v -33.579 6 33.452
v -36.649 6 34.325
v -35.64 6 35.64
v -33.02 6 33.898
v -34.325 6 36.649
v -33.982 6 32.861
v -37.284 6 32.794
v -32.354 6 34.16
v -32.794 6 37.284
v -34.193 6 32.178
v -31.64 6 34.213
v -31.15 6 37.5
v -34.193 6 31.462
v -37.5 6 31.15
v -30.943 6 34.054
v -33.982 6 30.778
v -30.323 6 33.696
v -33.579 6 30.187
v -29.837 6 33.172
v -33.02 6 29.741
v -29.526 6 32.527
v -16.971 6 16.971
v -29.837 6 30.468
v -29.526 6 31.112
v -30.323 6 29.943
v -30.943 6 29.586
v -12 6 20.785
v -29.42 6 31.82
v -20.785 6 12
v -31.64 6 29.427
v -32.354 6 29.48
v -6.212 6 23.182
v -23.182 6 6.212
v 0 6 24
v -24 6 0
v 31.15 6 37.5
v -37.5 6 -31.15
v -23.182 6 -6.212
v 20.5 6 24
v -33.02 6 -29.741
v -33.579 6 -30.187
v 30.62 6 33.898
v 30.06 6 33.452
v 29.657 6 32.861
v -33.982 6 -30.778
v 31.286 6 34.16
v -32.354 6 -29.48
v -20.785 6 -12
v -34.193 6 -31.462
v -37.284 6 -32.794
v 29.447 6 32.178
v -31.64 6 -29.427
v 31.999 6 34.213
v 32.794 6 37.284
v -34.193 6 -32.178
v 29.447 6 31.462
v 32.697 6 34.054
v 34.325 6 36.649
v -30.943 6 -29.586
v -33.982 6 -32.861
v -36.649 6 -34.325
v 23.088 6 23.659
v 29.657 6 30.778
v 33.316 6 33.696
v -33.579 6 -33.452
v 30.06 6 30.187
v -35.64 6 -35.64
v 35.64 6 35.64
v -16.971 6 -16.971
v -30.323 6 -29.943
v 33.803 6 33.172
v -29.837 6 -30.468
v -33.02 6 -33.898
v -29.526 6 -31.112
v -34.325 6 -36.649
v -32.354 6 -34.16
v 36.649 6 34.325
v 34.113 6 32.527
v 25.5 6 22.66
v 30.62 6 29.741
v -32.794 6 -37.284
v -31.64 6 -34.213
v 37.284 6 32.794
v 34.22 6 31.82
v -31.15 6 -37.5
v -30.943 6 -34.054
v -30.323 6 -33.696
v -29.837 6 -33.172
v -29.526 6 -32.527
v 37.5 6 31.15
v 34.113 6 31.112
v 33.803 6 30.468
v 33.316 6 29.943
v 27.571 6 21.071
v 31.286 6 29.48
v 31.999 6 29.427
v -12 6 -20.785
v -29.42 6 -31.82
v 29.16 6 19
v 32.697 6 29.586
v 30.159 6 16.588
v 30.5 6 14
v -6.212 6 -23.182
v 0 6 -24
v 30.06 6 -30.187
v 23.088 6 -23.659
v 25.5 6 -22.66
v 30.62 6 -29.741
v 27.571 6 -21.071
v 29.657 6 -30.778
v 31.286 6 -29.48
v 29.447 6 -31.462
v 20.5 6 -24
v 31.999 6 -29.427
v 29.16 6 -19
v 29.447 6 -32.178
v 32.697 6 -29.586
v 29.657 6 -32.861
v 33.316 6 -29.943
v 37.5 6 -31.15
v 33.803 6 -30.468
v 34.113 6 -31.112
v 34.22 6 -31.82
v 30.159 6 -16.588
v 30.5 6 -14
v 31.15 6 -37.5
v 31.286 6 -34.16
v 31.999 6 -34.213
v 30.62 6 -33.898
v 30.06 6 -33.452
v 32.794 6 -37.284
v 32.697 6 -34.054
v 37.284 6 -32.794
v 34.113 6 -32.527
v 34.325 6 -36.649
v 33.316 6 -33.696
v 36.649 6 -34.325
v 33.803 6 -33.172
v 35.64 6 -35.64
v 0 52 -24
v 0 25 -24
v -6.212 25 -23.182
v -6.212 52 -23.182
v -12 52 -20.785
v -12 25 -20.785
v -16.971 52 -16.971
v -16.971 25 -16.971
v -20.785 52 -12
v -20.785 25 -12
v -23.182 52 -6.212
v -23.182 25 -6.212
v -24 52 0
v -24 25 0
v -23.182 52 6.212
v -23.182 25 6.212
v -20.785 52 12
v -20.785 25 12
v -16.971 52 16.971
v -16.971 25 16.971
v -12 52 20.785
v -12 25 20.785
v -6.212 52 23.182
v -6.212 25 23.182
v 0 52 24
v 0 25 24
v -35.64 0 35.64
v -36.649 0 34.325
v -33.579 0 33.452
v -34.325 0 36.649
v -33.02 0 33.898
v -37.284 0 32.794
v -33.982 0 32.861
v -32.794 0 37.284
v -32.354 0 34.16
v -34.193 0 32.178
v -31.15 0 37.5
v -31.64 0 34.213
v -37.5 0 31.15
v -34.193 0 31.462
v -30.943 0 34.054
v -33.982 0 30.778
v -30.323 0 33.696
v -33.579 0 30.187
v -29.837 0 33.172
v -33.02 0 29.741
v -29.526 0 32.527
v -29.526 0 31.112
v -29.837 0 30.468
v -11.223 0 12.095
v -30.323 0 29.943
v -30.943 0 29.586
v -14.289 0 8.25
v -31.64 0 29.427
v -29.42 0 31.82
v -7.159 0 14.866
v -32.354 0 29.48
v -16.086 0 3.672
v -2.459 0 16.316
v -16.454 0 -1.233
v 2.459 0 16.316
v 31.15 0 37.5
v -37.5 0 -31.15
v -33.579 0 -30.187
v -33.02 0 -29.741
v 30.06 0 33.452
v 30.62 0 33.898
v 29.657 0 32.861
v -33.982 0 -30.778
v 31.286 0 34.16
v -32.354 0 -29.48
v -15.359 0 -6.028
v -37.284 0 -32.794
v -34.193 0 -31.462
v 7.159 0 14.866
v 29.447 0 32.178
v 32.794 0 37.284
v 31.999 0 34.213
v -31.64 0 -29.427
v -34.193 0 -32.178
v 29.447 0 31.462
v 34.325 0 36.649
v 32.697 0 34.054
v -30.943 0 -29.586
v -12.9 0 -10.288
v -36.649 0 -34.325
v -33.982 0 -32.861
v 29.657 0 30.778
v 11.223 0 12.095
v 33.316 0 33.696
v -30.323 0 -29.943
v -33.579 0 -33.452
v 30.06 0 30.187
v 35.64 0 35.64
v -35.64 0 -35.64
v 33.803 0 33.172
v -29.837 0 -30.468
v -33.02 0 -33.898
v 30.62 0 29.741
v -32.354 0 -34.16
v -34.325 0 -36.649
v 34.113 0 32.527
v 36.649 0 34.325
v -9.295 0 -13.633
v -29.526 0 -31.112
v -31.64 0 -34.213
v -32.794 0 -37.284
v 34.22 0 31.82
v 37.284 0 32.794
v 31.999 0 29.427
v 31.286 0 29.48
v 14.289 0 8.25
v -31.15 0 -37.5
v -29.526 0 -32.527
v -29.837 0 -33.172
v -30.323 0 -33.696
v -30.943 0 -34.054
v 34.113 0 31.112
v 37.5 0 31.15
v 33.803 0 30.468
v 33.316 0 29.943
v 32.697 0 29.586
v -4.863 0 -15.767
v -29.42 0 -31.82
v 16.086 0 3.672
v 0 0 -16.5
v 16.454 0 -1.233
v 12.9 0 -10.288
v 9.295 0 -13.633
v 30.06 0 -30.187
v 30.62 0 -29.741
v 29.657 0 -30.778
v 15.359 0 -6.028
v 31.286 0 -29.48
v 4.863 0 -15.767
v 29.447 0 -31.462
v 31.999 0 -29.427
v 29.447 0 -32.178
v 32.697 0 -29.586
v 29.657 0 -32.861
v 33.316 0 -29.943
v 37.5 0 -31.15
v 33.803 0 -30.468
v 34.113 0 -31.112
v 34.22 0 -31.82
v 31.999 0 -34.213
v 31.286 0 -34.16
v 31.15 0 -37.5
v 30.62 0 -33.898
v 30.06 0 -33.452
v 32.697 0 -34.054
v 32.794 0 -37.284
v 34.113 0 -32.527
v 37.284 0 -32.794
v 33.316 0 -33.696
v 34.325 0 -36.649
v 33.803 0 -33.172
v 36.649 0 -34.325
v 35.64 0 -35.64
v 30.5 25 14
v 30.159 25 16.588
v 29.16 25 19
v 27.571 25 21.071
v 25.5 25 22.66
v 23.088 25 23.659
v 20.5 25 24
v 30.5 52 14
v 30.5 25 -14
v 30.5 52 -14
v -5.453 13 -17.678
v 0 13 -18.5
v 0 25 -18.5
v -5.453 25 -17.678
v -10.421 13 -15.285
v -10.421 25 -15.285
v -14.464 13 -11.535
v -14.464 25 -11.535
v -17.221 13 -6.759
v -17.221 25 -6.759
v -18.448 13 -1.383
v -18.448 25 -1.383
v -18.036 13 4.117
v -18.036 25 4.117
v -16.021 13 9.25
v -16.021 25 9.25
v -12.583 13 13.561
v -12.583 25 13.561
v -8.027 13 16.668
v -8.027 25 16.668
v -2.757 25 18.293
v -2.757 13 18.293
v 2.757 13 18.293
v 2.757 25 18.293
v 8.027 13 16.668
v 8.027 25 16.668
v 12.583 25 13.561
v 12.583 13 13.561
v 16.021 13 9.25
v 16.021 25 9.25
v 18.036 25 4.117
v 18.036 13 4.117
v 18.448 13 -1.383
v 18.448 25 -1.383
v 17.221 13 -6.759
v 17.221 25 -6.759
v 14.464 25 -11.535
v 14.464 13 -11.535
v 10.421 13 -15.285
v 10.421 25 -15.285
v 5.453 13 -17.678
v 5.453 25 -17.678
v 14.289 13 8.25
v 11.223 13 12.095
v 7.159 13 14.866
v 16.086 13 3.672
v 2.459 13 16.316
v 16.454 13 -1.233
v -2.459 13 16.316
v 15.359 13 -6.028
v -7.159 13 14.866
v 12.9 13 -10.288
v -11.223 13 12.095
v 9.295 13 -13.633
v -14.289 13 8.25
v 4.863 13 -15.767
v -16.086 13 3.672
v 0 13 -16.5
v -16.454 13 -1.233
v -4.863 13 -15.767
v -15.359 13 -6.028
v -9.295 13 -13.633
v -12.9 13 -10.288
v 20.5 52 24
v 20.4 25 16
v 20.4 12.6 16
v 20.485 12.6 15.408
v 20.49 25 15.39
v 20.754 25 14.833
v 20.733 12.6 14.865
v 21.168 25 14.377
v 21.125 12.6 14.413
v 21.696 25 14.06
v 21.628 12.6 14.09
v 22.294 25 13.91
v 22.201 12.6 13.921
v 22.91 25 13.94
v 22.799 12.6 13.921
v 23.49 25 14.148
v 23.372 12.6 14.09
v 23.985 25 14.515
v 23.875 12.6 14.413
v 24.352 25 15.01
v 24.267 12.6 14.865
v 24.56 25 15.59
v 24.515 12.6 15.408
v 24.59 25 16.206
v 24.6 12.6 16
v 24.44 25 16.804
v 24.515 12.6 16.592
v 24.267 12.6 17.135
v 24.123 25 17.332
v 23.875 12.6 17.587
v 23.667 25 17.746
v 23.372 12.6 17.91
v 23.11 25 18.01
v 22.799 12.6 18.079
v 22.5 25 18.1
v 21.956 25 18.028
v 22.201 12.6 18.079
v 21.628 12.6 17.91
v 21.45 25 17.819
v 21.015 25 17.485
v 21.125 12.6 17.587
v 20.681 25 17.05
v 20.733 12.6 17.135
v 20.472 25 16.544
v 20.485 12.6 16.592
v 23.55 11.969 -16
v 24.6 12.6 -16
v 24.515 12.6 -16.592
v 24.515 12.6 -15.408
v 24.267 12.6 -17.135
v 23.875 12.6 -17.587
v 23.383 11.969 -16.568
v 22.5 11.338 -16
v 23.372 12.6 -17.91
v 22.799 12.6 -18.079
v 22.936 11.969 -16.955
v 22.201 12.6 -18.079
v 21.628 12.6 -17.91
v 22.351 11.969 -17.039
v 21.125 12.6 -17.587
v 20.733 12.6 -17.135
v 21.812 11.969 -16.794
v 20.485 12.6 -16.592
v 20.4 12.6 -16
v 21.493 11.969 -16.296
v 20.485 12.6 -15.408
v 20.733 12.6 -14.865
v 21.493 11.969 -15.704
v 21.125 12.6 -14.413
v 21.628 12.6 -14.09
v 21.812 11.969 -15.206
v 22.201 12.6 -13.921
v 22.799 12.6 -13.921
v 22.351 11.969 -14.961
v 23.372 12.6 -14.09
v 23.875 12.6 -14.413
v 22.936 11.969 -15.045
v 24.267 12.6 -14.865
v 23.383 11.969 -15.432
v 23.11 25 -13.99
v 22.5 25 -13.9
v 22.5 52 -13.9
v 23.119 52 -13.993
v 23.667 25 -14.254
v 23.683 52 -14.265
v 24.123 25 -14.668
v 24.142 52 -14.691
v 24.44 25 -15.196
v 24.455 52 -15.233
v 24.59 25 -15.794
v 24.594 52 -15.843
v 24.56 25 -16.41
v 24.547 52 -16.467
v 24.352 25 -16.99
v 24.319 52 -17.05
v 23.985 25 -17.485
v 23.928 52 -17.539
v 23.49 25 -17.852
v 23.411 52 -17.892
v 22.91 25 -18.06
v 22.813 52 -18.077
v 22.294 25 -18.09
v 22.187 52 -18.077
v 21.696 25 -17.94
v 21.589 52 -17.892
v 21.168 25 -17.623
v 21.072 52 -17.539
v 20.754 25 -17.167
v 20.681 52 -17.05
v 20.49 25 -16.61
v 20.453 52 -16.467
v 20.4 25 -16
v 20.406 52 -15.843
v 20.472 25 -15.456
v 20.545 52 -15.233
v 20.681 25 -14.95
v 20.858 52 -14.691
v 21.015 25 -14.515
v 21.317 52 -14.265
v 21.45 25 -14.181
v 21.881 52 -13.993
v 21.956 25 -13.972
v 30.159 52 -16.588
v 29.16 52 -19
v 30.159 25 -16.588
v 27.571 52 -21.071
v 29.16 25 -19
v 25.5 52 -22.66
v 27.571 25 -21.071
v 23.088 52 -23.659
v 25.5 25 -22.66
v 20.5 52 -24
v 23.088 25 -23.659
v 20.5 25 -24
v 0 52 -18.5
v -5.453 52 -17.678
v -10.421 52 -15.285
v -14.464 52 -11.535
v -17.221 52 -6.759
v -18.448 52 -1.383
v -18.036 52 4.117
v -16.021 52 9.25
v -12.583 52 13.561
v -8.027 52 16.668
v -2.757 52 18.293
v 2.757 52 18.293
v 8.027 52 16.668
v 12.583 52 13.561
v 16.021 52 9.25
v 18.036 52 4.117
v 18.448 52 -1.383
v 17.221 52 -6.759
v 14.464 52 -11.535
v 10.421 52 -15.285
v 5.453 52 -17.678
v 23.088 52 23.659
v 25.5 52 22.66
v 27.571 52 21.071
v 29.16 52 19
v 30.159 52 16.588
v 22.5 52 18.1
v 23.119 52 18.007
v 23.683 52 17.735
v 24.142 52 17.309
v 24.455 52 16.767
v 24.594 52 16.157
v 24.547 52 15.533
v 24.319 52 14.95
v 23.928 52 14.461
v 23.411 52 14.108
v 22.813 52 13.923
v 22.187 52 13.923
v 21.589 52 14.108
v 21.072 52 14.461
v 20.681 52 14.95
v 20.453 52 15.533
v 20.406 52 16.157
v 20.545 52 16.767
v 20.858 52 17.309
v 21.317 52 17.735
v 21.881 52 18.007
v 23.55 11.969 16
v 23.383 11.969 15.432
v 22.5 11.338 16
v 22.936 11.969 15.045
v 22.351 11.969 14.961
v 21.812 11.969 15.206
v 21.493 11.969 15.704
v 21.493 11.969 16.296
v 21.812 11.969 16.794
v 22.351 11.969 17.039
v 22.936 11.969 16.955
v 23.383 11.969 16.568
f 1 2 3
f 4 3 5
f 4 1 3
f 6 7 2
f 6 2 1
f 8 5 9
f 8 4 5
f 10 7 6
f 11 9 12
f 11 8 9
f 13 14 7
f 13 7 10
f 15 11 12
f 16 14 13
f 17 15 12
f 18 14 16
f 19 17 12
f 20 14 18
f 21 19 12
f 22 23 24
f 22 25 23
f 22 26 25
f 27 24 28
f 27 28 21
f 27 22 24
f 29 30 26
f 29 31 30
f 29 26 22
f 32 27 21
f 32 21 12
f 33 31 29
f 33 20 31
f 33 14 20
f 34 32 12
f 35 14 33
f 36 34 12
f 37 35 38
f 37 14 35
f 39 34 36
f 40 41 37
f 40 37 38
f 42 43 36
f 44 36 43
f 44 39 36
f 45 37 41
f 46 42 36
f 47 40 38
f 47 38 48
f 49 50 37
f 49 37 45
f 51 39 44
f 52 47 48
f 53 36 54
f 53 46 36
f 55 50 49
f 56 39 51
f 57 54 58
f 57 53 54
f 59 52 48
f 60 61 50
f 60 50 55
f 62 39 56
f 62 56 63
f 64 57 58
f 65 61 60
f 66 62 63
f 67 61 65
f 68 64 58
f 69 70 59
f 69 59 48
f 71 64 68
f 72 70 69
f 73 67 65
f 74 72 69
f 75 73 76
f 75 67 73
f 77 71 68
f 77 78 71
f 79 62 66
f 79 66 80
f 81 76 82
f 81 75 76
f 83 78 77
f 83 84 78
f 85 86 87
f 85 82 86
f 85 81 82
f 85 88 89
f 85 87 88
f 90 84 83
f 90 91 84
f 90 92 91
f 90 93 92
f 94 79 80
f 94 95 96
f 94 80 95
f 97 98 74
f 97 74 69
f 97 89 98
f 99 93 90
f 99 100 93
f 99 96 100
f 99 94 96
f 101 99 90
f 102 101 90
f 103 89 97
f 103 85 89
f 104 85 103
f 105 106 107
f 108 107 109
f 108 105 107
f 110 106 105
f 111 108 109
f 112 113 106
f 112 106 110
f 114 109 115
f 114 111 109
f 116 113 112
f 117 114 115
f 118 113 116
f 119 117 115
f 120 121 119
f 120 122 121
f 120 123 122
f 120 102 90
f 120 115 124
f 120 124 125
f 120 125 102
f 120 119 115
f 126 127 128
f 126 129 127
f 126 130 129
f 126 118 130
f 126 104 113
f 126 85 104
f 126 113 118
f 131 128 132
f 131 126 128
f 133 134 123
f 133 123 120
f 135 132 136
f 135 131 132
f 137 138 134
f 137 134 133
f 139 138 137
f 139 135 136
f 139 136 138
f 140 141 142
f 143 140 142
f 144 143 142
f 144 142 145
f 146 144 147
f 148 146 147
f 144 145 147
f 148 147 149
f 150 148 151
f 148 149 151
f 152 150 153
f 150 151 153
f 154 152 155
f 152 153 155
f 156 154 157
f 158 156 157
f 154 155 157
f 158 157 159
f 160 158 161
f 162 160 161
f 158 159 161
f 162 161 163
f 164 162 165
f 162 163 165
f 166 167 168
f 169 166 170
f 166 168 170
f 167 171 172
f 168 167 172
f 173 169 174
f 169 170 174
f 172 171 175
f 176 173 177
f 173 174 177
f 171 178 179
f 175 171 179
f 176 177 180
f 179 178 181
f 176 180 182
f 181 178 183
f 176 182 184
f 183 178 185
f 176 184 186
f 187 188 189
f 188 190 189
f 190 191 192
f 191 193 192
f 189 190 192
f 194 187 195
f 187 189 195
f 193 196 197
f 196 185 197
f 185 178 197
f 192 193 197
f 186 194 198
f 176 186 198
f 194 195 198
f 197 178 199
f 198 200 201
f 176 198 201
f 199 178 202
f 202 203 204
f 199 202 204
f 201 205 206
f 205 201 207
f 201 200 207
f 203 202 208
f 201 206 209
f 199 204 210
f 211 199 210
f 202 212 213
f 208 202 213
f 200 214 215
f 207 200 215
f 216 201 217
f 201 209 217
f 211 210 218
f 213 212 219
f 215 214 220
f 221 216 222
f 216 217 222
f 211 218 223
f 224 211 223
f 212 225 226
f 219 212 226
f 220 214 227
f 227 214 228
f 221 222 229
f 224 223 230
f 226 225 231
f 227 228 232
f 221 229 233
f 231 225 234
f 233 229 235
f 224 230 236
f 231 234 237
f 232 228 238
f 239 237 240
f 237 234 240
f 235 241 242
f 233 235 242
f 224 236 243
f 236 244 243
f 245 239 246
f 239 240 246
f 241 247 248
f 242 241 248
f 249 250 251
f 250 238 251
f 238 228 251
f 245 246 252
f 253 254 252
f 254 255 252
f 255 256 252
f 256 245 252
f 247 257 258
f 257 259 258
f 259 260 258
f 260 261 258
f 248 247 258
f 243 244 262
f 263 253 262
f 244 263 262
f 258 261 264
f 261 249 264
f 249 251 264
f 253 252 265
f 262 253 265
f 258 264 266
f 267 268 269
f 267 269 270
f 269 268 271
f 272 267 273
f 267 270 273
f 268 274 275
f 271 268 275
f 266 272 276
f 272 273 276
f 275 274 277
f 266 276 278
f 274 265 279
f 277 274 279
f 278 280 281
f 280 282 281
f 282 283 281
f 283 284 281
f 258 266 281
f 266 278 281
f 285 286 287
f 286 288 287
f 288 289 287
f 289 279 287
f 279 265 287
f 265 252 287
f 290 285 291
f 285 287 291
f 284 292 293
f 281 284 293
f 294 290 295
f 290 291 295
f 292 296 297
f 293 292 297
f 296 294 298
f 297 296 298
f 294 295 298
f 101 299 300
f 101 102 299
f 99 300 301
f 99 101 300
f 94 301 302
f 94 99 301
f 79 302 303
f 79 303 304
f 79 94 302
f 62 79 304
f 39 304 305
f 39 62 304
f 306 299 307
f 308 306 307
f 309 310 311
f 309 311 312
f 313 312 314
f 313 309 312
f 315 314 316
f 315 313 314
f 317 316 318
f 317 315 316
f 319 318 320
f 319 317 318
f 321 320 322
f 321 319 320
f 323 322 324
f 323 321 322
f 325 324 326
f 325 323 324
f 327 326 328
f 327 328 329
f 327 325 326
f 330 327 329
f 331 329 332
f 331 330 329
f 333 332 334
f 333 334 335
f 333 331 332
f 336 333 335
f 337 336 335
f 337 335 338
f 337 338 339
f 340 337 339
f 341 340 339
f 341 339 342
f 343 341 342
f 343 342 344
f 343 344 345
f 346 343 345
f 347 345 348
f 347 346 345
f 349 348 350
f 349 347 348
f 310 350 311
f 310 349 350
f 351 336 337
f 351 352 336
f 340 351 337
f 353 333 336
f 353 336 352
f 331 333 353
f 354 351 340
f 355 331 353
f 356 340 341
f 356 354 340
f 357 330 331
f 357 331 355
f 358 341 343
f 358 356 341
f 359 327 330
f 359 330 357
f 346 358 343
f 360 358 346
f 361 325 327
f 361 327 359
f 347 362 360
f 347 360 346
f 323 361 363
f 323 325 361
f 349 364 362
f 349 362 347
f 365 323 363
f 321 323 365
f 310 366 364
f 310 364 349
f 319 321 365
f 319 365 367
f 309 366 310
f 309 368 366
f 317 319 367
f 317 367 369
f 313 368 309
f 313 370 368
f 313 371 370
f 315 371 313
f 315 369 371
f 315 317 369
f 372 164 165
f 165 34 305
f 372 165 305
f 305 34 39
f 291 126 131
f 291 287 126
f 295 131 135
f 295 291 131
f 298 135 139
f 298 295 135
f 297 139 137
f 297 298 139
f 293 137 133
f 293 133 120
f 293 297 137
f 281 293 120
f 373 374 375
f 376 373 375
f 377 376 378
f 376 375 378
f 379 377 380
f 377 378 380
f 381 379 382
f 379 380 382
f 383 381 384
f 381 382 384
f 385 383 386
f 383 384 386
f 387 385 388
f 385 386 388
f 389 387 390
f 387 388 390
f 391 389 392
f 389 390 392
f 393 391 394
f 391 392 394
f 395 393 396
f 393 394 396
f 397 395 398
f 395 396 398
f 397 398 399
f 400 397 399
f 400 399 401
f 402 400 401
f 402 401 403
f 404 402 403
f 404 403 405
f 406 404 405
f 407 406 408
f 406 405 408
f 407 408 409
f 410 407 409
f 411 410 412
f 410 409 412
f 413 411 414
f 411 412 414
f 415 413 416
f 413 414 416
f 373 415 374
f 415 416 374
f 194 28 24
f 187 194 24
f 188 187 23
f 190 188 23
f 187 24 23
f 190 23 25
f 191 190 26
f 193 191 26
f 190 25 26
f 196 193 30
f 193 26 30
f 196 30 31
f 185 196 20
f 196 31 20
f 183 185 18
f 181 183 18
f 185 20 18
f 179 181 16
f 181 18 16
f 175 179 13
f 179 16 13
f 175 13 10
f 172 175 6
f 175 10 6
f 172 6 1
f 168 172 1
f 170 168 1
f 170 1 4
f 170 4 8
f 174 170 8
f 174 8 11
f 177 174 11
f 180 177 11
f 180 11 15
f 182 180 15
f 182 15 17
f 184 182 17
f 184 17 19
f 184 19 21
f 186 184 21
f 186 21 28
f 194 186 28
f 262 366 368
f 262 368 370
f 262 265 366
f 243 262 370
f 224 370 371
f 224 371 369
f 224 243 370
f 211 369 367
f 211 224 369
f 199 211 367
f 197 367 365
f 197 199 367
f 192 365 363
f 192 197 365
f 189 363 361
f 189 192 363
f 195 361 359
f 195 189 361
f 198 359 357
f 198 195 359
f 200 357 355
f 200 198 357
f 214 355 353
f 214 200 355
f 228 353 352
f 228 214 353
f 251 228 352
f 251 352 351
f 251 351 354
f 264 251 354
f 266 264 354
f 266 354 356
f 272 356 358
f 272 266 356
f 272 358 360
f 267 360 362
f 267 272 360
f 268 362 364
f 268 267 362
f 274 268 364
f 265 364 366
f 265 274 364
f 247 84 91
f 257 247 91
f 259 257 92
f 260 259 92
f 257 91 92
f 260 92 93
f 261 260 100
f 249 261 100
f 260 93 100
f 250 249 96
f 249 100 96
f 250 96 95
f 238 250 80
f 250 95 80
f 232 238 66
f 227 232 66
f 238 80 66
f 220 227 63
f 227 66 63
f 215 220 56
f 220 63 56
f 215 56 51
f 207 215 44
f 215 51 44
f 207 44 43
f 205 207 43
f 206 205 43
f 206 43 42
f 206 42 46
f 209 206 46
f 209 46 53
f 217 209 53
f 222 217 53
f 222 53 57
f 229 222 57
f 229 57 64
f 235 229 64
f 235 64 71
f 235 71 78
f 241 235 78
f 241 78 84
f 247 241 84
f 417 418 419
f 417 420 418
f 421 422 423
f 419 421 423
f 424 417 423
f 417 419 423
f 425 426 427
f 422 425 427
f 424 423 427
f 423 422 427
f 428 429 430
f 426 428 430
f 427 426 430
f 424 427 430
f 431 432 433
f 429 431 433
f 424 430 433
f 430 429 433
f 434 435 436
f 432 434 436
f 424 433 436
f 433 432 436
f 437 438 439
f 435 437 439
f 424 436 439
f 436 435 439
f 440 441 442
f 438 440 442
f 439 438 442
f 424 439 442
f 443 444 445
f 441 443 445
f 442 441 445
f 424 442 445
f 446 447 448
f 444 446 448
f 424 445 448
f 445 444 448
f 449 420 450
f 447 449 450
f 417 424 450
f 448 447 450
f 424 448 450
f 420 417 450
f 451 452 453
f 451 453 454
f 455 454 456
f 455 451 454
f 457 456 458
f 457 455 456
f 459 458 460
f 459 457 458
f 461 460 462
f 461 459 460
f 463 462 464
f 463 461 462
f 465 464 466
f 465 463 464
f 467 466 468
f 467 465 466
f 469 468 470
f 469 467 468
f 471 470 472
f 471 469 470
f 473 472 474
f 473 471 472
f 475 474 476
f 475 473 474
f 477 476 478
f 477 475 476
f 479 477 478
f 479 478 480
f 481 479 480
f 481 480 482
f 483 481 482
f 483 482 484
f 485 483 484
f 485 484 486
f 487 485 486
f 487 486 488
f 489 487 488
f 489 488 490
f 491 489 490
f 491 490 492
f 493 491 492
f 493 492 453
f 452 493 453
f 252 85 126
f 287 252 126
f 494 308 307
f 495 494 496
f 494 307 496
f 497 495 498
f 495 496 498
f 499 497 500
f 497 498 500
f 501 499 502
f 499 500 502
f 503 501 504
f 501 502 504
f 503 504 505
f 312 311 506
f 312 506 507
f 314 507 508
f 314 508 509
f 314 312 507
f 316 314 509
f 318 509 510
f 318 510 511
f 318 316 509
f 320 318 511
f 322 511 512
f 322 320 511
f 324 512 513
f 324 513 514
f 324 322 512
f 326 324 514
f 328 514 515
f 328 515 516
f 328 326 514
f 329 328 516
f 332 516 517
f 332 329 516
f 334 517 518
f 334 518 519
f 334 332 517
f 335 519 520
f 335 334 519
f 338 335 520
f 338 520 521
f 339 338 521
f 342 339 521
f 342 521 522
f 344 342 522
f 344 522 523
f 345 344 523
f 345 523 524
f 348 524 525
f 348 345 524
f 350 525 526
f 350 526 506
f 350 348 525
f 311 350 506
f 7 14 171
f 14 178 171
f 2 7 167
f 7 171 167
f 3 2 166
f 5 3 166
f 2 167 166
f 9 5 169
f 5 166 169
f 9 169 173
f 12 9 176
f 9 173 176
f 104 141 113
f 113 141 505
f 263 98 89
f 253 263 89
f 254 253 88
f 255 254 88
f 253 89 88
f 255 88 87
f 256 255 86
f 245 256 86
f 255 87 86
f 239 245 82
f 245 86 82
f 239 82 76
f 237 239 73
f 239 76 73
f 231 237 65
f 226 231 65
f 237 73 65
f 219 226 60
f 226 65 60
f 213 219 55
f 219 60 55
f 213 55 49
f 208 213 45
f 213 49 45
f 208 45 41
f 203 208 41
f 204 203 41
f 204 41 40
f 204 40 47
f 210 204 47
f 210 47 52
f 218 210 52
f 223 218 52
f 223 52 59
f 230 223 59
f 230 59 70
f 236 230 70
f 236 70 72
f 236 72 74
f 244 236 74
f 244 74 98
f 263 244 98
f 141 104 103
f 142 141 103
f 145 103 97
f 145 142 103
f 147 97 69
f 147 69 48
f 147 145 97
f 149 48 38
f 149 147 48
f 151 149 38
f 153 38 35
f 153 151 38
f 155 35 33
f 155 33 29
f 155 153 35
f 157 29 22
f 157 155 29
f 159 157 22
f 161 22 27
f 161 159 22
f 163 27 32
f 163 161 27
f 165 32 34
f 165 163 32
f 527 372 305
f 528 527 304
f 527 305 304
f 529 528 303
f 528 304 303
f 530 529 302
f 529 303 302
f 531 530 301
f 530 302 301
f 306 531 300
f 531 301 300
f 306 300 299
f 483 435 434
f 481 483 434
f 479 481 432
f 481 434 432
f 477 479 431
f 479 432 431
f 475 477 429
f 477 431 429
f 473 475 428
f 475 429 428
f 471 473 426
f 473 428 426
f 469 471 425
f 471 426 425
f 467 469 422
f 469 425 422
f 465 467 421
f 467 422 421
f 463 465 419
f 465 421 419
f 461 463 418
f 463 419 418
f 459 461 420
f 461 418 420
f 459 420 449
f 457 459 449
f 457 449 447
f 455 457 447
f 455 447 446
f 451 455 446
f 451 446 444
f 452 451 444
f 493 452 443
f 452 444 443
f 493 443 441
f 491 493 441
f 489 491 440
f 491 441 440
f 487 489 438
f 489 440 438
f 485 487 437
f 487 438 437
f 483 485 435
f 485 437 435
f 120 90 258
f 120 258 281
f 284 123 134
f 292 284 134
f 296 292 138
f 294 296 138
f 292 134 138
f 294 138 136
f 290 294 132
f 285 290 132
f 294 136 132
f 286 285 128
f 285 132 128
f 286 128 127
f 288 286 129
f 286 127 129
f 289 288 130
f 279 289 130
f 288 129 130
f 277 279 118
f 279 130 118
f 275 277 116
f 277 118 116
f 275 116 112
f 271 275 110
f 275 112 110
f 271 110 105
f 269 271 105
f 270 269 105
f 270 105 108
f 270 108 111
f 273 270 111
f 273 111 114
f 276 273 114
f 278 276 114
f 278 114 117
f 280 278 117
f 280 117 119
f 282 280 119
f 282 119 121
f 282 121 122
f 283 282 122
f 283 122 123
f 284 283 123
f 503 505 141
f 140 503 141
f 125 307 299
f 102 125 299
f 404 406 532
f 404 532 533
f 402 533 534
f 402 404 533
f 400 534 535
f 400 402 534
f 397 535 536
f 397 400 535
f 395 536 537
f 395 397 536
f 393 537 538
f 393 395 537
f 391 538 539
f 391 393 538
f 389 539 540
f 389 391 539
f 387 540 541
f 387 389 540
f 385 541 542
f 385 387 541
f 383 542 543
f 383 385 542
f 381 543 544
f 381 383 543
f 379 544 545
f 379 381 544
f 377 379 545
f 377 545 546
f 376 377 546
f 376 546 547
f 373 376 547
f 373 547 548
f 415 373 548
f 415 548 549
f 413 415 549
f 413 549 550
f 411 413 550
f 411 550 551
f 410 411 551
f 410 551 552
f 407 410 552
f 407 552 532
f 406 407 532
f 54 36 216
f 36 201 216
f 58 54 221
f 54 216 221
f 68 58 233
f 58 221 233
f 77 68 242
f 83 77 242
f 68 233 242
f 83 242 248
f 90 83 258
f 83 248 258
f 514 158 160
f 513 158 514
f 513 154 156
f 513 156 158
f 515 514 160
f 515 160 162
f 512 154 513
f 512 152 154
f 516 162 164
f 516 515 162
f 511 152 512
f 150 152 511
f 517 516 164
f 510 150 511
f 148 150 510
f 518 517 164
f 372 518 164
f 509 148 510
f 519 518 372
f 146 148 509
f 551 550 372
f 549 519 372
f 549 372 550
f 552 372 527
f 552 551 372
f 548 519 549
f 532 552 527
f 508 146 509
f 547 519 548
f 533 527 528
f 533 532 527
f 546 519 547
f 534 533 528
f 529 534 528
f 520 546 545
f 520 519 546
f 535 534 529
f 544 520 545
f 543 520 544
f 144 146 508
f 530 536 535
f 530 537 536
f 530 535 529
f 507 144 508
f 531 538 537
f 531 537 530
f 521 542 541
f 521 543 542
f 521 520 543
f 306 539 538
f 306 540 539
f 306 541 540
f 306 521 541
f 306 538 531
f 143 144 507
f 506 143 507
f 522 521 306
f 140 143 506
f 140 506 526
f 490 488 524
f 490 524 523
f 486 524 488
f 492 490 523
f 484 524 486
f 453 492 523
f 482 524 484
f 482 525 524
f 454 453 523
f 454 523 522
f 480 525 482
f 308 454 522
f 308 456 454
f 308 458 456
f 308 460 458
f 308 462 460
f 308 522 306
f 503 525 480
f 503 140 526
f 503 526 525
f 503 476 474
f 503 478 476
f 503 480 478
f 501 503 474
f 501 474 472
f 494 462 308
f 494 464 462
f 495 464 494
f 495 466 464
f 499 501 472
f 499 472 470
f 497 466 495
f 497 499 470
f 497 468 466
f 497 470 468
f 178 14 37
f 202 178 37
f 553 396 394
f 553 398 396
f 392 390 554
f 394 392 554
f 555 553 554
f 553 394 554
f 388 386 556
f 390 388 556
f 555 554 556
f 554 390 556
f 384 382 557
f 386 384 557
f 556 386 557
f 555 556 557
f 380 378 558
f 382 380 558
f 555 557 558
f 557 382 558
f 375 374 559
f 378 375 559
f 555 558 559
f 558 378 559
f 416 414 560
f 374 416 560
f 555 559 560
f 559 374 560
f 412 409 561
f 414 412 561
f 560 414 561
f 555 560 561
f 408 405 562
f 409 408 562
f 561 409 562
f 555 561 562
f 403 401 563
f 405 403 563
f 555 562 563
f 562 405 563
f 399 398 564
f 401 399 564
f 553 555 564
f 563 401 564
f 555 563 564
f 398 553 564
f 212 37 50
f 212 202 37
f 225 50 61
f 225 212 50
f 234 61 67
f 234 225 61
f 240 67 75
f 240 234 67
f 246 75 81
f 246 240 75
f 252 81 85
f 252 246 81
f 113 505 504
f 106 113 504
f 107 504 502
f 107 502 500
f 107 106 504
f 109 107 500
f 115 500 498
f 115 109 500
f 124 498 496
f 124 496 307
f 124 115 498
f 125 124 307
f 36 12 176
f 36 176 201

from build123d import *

# Parameters (mm, degrees)
SKETCH2_W                = 75
SKETCH2_H                = 75
SKETCH2_R                = 21
BOSS_EXTRUDE1_DEPTH      = 6
M4_CLEARANCE_HOLE1_D     = 4.8
M4_CLEARANCE_HOLE1_DEPTH = 25
FILLET1_R                = 6.35
SKETCH5_R                = 22.809118079
BOSS_EXTRUDE2_DEPTH      = 19
FILLET2_R                = 10
M5_TAPPED_HOLE1_D        = 4.2
M5_TAPPED_HOLE1_DEPTH    = 12.4
M5_TAPPED_HOLE1_TIP      = 1.2618073
SKETCH11_R               = 18.5
SKETCH11_R_2             = 2.1
BOSS_EXTRUDE3_DEPTH      = 27


with BuildPart() as part:
    # Sketch1 → Revolve1 (revolve)
    with BuildSketch(Plane.XY, mode=Mode.PRIVATE) as revolve1_sk:
        Polygon((-16.5, 0), (-34, 0), (-34, 6), (-24, 6), (-24, 25), (-18.5, 25), (-18.5, 13), (-16.5, 13), align=None)
    revolve(revolve1_sk.sketch.rotate(Axis((0, 0, 0), (0, 1, 0)), 270), axis=Axis((0, 0, 0), (0, 1, 0)))

    # Sketch2 → Boss-Extrude1 (add)
    with BuildSketch(Plane(origin=(0, 6, 0), x_dir=(1, 0, 0), z_dir=(0, 1, 0))):
        Rectangle(SKETCH2_W, SKETCH2_H)
        Circle(SKETCH2_R, mode=Mode.SUBTRACT)
    extrude(amount=-BOSS_EXTRUDE1_DEPTH)

    # M4 Clearance Hole1
    with Locations(Plane(origin=(0, 0, 0), x_dir=(-1, 0, 0), z_dir=(0, -1, 0))):
        with Locations((0, 0), (-31.819805153, 31.819805153), (31.819805153, 31.819805153), (31.819805153, -31.819805153), (-31.819805153, -31.819805153)):
            Hole(M4_CLEARANCE_HOLE1_D / 2, depth=M4_CLEARANCE_HOLE1_DEPTH)

    # Fillet1
    fillet1_edges = [part.edges().sort_by_distance(p)[0] for p in [
        (37.5, 3, 37.5),
        (37.5, 3, -37.5),
        (-37.5, 3, -37.5),
        (-37.5, 3, 37.5),
    ]]
    fillet(fillet1_edges, radius=FILLET1_R)

    # Sketch5 → Boss-Extrude2 (add)
    with BuildSketch(Plane(origin=(0, 25, 0), x_dir=(1, 0, 0), z_dir=(0, 1, 0))):
        with BuildLine():
            Line((0, 24), (6.5, 24))
            Line((6.5, 24), (30.5, 24))
            Line((30.5, 24), (30.5, -24))
            Line((30.5, -24), (6.5, -24))
            Line((6.5, -24), (0, -24))
            ThreePointArc((0, -24), (-24, 0), (0, 24))
        make_face()
        Circle(SKETCH5_R, mode=Mode.SUBTRACT)
    extrude(amount=-BOSS_EXTRUDE2_DEPTH)

    # Fillet2
    fillet2_edges = [part.edges().sort_by_distance(p)[0] for p in [
        (30.5, 15.5, -24),
        (30.5, 15.5, 24),
    ]]
    fillet(fillet2_edges, radius=FILLET2_R)

    # M5 Tapped Hole1
    with Locations(Plane(origin=(0, 25, 0), x_dir=(1, 0, 0), z_dir=(0, 1, 0))):
        with Locations((22.5, 16), (22.5, -16)):
            Hole(M5_TAPPED_HOLE1_D / 2, depth=M5_TAPPED_HOLE1_DEPTH)
            with Locations((0, 0, -(M5_TAPPED_HOLE1_DEPTH + M5_TAPPED_HOLE1_TIP / 2))):  # 118° drill point
                Cone(0, M5_TAPPED_HOLE1_D / 2, M5_TAPPED_HOLE1_TIP, mode=Mode.SUBTRACT)

    # Sketch11 → Boss-Extrude3 (add)
    with BuildSketch(Plane(origin=(0, 25, 0), x_dir=(1, 0, 0), z_dir=(0, 1, 0))):
        with BuildLine():
            Line((0, -24), (20.5, -24))
            ThreePointArc((20.5, -24), (27.571067812, -21.071067812), (30.5, -14))
            Line((30.5, -14), (30.5, 14))
            ThreePointArc((30.5, 14), (27.571067812, 21.071067812), (20.5, 24))
            Line((20.5, 24), (0, 24))
            ThreePointArc((0, 24), (-24, 0), (0, -24))
        make_face()
        with Locations(Location((0, 0, 0), (0, 0, 90))):
            Circle(SKETCH11_R, mode=Mode.SUBTRACT)
        with Locations(Location((22.5, -16, 0), (0, 0, 270))):
            Circle(SKETCH11_R_2, mode=Mode.SUBTRACT)
        with Locations(Location((22.5, 16, 0), (0, 0, 270))):
            Circle(SKETCH11_R_2, mode=Mode.SUBTRACT)
    extrude(amount=BOSS_EXTRUDE3_DEPTH)


solid = part.part
